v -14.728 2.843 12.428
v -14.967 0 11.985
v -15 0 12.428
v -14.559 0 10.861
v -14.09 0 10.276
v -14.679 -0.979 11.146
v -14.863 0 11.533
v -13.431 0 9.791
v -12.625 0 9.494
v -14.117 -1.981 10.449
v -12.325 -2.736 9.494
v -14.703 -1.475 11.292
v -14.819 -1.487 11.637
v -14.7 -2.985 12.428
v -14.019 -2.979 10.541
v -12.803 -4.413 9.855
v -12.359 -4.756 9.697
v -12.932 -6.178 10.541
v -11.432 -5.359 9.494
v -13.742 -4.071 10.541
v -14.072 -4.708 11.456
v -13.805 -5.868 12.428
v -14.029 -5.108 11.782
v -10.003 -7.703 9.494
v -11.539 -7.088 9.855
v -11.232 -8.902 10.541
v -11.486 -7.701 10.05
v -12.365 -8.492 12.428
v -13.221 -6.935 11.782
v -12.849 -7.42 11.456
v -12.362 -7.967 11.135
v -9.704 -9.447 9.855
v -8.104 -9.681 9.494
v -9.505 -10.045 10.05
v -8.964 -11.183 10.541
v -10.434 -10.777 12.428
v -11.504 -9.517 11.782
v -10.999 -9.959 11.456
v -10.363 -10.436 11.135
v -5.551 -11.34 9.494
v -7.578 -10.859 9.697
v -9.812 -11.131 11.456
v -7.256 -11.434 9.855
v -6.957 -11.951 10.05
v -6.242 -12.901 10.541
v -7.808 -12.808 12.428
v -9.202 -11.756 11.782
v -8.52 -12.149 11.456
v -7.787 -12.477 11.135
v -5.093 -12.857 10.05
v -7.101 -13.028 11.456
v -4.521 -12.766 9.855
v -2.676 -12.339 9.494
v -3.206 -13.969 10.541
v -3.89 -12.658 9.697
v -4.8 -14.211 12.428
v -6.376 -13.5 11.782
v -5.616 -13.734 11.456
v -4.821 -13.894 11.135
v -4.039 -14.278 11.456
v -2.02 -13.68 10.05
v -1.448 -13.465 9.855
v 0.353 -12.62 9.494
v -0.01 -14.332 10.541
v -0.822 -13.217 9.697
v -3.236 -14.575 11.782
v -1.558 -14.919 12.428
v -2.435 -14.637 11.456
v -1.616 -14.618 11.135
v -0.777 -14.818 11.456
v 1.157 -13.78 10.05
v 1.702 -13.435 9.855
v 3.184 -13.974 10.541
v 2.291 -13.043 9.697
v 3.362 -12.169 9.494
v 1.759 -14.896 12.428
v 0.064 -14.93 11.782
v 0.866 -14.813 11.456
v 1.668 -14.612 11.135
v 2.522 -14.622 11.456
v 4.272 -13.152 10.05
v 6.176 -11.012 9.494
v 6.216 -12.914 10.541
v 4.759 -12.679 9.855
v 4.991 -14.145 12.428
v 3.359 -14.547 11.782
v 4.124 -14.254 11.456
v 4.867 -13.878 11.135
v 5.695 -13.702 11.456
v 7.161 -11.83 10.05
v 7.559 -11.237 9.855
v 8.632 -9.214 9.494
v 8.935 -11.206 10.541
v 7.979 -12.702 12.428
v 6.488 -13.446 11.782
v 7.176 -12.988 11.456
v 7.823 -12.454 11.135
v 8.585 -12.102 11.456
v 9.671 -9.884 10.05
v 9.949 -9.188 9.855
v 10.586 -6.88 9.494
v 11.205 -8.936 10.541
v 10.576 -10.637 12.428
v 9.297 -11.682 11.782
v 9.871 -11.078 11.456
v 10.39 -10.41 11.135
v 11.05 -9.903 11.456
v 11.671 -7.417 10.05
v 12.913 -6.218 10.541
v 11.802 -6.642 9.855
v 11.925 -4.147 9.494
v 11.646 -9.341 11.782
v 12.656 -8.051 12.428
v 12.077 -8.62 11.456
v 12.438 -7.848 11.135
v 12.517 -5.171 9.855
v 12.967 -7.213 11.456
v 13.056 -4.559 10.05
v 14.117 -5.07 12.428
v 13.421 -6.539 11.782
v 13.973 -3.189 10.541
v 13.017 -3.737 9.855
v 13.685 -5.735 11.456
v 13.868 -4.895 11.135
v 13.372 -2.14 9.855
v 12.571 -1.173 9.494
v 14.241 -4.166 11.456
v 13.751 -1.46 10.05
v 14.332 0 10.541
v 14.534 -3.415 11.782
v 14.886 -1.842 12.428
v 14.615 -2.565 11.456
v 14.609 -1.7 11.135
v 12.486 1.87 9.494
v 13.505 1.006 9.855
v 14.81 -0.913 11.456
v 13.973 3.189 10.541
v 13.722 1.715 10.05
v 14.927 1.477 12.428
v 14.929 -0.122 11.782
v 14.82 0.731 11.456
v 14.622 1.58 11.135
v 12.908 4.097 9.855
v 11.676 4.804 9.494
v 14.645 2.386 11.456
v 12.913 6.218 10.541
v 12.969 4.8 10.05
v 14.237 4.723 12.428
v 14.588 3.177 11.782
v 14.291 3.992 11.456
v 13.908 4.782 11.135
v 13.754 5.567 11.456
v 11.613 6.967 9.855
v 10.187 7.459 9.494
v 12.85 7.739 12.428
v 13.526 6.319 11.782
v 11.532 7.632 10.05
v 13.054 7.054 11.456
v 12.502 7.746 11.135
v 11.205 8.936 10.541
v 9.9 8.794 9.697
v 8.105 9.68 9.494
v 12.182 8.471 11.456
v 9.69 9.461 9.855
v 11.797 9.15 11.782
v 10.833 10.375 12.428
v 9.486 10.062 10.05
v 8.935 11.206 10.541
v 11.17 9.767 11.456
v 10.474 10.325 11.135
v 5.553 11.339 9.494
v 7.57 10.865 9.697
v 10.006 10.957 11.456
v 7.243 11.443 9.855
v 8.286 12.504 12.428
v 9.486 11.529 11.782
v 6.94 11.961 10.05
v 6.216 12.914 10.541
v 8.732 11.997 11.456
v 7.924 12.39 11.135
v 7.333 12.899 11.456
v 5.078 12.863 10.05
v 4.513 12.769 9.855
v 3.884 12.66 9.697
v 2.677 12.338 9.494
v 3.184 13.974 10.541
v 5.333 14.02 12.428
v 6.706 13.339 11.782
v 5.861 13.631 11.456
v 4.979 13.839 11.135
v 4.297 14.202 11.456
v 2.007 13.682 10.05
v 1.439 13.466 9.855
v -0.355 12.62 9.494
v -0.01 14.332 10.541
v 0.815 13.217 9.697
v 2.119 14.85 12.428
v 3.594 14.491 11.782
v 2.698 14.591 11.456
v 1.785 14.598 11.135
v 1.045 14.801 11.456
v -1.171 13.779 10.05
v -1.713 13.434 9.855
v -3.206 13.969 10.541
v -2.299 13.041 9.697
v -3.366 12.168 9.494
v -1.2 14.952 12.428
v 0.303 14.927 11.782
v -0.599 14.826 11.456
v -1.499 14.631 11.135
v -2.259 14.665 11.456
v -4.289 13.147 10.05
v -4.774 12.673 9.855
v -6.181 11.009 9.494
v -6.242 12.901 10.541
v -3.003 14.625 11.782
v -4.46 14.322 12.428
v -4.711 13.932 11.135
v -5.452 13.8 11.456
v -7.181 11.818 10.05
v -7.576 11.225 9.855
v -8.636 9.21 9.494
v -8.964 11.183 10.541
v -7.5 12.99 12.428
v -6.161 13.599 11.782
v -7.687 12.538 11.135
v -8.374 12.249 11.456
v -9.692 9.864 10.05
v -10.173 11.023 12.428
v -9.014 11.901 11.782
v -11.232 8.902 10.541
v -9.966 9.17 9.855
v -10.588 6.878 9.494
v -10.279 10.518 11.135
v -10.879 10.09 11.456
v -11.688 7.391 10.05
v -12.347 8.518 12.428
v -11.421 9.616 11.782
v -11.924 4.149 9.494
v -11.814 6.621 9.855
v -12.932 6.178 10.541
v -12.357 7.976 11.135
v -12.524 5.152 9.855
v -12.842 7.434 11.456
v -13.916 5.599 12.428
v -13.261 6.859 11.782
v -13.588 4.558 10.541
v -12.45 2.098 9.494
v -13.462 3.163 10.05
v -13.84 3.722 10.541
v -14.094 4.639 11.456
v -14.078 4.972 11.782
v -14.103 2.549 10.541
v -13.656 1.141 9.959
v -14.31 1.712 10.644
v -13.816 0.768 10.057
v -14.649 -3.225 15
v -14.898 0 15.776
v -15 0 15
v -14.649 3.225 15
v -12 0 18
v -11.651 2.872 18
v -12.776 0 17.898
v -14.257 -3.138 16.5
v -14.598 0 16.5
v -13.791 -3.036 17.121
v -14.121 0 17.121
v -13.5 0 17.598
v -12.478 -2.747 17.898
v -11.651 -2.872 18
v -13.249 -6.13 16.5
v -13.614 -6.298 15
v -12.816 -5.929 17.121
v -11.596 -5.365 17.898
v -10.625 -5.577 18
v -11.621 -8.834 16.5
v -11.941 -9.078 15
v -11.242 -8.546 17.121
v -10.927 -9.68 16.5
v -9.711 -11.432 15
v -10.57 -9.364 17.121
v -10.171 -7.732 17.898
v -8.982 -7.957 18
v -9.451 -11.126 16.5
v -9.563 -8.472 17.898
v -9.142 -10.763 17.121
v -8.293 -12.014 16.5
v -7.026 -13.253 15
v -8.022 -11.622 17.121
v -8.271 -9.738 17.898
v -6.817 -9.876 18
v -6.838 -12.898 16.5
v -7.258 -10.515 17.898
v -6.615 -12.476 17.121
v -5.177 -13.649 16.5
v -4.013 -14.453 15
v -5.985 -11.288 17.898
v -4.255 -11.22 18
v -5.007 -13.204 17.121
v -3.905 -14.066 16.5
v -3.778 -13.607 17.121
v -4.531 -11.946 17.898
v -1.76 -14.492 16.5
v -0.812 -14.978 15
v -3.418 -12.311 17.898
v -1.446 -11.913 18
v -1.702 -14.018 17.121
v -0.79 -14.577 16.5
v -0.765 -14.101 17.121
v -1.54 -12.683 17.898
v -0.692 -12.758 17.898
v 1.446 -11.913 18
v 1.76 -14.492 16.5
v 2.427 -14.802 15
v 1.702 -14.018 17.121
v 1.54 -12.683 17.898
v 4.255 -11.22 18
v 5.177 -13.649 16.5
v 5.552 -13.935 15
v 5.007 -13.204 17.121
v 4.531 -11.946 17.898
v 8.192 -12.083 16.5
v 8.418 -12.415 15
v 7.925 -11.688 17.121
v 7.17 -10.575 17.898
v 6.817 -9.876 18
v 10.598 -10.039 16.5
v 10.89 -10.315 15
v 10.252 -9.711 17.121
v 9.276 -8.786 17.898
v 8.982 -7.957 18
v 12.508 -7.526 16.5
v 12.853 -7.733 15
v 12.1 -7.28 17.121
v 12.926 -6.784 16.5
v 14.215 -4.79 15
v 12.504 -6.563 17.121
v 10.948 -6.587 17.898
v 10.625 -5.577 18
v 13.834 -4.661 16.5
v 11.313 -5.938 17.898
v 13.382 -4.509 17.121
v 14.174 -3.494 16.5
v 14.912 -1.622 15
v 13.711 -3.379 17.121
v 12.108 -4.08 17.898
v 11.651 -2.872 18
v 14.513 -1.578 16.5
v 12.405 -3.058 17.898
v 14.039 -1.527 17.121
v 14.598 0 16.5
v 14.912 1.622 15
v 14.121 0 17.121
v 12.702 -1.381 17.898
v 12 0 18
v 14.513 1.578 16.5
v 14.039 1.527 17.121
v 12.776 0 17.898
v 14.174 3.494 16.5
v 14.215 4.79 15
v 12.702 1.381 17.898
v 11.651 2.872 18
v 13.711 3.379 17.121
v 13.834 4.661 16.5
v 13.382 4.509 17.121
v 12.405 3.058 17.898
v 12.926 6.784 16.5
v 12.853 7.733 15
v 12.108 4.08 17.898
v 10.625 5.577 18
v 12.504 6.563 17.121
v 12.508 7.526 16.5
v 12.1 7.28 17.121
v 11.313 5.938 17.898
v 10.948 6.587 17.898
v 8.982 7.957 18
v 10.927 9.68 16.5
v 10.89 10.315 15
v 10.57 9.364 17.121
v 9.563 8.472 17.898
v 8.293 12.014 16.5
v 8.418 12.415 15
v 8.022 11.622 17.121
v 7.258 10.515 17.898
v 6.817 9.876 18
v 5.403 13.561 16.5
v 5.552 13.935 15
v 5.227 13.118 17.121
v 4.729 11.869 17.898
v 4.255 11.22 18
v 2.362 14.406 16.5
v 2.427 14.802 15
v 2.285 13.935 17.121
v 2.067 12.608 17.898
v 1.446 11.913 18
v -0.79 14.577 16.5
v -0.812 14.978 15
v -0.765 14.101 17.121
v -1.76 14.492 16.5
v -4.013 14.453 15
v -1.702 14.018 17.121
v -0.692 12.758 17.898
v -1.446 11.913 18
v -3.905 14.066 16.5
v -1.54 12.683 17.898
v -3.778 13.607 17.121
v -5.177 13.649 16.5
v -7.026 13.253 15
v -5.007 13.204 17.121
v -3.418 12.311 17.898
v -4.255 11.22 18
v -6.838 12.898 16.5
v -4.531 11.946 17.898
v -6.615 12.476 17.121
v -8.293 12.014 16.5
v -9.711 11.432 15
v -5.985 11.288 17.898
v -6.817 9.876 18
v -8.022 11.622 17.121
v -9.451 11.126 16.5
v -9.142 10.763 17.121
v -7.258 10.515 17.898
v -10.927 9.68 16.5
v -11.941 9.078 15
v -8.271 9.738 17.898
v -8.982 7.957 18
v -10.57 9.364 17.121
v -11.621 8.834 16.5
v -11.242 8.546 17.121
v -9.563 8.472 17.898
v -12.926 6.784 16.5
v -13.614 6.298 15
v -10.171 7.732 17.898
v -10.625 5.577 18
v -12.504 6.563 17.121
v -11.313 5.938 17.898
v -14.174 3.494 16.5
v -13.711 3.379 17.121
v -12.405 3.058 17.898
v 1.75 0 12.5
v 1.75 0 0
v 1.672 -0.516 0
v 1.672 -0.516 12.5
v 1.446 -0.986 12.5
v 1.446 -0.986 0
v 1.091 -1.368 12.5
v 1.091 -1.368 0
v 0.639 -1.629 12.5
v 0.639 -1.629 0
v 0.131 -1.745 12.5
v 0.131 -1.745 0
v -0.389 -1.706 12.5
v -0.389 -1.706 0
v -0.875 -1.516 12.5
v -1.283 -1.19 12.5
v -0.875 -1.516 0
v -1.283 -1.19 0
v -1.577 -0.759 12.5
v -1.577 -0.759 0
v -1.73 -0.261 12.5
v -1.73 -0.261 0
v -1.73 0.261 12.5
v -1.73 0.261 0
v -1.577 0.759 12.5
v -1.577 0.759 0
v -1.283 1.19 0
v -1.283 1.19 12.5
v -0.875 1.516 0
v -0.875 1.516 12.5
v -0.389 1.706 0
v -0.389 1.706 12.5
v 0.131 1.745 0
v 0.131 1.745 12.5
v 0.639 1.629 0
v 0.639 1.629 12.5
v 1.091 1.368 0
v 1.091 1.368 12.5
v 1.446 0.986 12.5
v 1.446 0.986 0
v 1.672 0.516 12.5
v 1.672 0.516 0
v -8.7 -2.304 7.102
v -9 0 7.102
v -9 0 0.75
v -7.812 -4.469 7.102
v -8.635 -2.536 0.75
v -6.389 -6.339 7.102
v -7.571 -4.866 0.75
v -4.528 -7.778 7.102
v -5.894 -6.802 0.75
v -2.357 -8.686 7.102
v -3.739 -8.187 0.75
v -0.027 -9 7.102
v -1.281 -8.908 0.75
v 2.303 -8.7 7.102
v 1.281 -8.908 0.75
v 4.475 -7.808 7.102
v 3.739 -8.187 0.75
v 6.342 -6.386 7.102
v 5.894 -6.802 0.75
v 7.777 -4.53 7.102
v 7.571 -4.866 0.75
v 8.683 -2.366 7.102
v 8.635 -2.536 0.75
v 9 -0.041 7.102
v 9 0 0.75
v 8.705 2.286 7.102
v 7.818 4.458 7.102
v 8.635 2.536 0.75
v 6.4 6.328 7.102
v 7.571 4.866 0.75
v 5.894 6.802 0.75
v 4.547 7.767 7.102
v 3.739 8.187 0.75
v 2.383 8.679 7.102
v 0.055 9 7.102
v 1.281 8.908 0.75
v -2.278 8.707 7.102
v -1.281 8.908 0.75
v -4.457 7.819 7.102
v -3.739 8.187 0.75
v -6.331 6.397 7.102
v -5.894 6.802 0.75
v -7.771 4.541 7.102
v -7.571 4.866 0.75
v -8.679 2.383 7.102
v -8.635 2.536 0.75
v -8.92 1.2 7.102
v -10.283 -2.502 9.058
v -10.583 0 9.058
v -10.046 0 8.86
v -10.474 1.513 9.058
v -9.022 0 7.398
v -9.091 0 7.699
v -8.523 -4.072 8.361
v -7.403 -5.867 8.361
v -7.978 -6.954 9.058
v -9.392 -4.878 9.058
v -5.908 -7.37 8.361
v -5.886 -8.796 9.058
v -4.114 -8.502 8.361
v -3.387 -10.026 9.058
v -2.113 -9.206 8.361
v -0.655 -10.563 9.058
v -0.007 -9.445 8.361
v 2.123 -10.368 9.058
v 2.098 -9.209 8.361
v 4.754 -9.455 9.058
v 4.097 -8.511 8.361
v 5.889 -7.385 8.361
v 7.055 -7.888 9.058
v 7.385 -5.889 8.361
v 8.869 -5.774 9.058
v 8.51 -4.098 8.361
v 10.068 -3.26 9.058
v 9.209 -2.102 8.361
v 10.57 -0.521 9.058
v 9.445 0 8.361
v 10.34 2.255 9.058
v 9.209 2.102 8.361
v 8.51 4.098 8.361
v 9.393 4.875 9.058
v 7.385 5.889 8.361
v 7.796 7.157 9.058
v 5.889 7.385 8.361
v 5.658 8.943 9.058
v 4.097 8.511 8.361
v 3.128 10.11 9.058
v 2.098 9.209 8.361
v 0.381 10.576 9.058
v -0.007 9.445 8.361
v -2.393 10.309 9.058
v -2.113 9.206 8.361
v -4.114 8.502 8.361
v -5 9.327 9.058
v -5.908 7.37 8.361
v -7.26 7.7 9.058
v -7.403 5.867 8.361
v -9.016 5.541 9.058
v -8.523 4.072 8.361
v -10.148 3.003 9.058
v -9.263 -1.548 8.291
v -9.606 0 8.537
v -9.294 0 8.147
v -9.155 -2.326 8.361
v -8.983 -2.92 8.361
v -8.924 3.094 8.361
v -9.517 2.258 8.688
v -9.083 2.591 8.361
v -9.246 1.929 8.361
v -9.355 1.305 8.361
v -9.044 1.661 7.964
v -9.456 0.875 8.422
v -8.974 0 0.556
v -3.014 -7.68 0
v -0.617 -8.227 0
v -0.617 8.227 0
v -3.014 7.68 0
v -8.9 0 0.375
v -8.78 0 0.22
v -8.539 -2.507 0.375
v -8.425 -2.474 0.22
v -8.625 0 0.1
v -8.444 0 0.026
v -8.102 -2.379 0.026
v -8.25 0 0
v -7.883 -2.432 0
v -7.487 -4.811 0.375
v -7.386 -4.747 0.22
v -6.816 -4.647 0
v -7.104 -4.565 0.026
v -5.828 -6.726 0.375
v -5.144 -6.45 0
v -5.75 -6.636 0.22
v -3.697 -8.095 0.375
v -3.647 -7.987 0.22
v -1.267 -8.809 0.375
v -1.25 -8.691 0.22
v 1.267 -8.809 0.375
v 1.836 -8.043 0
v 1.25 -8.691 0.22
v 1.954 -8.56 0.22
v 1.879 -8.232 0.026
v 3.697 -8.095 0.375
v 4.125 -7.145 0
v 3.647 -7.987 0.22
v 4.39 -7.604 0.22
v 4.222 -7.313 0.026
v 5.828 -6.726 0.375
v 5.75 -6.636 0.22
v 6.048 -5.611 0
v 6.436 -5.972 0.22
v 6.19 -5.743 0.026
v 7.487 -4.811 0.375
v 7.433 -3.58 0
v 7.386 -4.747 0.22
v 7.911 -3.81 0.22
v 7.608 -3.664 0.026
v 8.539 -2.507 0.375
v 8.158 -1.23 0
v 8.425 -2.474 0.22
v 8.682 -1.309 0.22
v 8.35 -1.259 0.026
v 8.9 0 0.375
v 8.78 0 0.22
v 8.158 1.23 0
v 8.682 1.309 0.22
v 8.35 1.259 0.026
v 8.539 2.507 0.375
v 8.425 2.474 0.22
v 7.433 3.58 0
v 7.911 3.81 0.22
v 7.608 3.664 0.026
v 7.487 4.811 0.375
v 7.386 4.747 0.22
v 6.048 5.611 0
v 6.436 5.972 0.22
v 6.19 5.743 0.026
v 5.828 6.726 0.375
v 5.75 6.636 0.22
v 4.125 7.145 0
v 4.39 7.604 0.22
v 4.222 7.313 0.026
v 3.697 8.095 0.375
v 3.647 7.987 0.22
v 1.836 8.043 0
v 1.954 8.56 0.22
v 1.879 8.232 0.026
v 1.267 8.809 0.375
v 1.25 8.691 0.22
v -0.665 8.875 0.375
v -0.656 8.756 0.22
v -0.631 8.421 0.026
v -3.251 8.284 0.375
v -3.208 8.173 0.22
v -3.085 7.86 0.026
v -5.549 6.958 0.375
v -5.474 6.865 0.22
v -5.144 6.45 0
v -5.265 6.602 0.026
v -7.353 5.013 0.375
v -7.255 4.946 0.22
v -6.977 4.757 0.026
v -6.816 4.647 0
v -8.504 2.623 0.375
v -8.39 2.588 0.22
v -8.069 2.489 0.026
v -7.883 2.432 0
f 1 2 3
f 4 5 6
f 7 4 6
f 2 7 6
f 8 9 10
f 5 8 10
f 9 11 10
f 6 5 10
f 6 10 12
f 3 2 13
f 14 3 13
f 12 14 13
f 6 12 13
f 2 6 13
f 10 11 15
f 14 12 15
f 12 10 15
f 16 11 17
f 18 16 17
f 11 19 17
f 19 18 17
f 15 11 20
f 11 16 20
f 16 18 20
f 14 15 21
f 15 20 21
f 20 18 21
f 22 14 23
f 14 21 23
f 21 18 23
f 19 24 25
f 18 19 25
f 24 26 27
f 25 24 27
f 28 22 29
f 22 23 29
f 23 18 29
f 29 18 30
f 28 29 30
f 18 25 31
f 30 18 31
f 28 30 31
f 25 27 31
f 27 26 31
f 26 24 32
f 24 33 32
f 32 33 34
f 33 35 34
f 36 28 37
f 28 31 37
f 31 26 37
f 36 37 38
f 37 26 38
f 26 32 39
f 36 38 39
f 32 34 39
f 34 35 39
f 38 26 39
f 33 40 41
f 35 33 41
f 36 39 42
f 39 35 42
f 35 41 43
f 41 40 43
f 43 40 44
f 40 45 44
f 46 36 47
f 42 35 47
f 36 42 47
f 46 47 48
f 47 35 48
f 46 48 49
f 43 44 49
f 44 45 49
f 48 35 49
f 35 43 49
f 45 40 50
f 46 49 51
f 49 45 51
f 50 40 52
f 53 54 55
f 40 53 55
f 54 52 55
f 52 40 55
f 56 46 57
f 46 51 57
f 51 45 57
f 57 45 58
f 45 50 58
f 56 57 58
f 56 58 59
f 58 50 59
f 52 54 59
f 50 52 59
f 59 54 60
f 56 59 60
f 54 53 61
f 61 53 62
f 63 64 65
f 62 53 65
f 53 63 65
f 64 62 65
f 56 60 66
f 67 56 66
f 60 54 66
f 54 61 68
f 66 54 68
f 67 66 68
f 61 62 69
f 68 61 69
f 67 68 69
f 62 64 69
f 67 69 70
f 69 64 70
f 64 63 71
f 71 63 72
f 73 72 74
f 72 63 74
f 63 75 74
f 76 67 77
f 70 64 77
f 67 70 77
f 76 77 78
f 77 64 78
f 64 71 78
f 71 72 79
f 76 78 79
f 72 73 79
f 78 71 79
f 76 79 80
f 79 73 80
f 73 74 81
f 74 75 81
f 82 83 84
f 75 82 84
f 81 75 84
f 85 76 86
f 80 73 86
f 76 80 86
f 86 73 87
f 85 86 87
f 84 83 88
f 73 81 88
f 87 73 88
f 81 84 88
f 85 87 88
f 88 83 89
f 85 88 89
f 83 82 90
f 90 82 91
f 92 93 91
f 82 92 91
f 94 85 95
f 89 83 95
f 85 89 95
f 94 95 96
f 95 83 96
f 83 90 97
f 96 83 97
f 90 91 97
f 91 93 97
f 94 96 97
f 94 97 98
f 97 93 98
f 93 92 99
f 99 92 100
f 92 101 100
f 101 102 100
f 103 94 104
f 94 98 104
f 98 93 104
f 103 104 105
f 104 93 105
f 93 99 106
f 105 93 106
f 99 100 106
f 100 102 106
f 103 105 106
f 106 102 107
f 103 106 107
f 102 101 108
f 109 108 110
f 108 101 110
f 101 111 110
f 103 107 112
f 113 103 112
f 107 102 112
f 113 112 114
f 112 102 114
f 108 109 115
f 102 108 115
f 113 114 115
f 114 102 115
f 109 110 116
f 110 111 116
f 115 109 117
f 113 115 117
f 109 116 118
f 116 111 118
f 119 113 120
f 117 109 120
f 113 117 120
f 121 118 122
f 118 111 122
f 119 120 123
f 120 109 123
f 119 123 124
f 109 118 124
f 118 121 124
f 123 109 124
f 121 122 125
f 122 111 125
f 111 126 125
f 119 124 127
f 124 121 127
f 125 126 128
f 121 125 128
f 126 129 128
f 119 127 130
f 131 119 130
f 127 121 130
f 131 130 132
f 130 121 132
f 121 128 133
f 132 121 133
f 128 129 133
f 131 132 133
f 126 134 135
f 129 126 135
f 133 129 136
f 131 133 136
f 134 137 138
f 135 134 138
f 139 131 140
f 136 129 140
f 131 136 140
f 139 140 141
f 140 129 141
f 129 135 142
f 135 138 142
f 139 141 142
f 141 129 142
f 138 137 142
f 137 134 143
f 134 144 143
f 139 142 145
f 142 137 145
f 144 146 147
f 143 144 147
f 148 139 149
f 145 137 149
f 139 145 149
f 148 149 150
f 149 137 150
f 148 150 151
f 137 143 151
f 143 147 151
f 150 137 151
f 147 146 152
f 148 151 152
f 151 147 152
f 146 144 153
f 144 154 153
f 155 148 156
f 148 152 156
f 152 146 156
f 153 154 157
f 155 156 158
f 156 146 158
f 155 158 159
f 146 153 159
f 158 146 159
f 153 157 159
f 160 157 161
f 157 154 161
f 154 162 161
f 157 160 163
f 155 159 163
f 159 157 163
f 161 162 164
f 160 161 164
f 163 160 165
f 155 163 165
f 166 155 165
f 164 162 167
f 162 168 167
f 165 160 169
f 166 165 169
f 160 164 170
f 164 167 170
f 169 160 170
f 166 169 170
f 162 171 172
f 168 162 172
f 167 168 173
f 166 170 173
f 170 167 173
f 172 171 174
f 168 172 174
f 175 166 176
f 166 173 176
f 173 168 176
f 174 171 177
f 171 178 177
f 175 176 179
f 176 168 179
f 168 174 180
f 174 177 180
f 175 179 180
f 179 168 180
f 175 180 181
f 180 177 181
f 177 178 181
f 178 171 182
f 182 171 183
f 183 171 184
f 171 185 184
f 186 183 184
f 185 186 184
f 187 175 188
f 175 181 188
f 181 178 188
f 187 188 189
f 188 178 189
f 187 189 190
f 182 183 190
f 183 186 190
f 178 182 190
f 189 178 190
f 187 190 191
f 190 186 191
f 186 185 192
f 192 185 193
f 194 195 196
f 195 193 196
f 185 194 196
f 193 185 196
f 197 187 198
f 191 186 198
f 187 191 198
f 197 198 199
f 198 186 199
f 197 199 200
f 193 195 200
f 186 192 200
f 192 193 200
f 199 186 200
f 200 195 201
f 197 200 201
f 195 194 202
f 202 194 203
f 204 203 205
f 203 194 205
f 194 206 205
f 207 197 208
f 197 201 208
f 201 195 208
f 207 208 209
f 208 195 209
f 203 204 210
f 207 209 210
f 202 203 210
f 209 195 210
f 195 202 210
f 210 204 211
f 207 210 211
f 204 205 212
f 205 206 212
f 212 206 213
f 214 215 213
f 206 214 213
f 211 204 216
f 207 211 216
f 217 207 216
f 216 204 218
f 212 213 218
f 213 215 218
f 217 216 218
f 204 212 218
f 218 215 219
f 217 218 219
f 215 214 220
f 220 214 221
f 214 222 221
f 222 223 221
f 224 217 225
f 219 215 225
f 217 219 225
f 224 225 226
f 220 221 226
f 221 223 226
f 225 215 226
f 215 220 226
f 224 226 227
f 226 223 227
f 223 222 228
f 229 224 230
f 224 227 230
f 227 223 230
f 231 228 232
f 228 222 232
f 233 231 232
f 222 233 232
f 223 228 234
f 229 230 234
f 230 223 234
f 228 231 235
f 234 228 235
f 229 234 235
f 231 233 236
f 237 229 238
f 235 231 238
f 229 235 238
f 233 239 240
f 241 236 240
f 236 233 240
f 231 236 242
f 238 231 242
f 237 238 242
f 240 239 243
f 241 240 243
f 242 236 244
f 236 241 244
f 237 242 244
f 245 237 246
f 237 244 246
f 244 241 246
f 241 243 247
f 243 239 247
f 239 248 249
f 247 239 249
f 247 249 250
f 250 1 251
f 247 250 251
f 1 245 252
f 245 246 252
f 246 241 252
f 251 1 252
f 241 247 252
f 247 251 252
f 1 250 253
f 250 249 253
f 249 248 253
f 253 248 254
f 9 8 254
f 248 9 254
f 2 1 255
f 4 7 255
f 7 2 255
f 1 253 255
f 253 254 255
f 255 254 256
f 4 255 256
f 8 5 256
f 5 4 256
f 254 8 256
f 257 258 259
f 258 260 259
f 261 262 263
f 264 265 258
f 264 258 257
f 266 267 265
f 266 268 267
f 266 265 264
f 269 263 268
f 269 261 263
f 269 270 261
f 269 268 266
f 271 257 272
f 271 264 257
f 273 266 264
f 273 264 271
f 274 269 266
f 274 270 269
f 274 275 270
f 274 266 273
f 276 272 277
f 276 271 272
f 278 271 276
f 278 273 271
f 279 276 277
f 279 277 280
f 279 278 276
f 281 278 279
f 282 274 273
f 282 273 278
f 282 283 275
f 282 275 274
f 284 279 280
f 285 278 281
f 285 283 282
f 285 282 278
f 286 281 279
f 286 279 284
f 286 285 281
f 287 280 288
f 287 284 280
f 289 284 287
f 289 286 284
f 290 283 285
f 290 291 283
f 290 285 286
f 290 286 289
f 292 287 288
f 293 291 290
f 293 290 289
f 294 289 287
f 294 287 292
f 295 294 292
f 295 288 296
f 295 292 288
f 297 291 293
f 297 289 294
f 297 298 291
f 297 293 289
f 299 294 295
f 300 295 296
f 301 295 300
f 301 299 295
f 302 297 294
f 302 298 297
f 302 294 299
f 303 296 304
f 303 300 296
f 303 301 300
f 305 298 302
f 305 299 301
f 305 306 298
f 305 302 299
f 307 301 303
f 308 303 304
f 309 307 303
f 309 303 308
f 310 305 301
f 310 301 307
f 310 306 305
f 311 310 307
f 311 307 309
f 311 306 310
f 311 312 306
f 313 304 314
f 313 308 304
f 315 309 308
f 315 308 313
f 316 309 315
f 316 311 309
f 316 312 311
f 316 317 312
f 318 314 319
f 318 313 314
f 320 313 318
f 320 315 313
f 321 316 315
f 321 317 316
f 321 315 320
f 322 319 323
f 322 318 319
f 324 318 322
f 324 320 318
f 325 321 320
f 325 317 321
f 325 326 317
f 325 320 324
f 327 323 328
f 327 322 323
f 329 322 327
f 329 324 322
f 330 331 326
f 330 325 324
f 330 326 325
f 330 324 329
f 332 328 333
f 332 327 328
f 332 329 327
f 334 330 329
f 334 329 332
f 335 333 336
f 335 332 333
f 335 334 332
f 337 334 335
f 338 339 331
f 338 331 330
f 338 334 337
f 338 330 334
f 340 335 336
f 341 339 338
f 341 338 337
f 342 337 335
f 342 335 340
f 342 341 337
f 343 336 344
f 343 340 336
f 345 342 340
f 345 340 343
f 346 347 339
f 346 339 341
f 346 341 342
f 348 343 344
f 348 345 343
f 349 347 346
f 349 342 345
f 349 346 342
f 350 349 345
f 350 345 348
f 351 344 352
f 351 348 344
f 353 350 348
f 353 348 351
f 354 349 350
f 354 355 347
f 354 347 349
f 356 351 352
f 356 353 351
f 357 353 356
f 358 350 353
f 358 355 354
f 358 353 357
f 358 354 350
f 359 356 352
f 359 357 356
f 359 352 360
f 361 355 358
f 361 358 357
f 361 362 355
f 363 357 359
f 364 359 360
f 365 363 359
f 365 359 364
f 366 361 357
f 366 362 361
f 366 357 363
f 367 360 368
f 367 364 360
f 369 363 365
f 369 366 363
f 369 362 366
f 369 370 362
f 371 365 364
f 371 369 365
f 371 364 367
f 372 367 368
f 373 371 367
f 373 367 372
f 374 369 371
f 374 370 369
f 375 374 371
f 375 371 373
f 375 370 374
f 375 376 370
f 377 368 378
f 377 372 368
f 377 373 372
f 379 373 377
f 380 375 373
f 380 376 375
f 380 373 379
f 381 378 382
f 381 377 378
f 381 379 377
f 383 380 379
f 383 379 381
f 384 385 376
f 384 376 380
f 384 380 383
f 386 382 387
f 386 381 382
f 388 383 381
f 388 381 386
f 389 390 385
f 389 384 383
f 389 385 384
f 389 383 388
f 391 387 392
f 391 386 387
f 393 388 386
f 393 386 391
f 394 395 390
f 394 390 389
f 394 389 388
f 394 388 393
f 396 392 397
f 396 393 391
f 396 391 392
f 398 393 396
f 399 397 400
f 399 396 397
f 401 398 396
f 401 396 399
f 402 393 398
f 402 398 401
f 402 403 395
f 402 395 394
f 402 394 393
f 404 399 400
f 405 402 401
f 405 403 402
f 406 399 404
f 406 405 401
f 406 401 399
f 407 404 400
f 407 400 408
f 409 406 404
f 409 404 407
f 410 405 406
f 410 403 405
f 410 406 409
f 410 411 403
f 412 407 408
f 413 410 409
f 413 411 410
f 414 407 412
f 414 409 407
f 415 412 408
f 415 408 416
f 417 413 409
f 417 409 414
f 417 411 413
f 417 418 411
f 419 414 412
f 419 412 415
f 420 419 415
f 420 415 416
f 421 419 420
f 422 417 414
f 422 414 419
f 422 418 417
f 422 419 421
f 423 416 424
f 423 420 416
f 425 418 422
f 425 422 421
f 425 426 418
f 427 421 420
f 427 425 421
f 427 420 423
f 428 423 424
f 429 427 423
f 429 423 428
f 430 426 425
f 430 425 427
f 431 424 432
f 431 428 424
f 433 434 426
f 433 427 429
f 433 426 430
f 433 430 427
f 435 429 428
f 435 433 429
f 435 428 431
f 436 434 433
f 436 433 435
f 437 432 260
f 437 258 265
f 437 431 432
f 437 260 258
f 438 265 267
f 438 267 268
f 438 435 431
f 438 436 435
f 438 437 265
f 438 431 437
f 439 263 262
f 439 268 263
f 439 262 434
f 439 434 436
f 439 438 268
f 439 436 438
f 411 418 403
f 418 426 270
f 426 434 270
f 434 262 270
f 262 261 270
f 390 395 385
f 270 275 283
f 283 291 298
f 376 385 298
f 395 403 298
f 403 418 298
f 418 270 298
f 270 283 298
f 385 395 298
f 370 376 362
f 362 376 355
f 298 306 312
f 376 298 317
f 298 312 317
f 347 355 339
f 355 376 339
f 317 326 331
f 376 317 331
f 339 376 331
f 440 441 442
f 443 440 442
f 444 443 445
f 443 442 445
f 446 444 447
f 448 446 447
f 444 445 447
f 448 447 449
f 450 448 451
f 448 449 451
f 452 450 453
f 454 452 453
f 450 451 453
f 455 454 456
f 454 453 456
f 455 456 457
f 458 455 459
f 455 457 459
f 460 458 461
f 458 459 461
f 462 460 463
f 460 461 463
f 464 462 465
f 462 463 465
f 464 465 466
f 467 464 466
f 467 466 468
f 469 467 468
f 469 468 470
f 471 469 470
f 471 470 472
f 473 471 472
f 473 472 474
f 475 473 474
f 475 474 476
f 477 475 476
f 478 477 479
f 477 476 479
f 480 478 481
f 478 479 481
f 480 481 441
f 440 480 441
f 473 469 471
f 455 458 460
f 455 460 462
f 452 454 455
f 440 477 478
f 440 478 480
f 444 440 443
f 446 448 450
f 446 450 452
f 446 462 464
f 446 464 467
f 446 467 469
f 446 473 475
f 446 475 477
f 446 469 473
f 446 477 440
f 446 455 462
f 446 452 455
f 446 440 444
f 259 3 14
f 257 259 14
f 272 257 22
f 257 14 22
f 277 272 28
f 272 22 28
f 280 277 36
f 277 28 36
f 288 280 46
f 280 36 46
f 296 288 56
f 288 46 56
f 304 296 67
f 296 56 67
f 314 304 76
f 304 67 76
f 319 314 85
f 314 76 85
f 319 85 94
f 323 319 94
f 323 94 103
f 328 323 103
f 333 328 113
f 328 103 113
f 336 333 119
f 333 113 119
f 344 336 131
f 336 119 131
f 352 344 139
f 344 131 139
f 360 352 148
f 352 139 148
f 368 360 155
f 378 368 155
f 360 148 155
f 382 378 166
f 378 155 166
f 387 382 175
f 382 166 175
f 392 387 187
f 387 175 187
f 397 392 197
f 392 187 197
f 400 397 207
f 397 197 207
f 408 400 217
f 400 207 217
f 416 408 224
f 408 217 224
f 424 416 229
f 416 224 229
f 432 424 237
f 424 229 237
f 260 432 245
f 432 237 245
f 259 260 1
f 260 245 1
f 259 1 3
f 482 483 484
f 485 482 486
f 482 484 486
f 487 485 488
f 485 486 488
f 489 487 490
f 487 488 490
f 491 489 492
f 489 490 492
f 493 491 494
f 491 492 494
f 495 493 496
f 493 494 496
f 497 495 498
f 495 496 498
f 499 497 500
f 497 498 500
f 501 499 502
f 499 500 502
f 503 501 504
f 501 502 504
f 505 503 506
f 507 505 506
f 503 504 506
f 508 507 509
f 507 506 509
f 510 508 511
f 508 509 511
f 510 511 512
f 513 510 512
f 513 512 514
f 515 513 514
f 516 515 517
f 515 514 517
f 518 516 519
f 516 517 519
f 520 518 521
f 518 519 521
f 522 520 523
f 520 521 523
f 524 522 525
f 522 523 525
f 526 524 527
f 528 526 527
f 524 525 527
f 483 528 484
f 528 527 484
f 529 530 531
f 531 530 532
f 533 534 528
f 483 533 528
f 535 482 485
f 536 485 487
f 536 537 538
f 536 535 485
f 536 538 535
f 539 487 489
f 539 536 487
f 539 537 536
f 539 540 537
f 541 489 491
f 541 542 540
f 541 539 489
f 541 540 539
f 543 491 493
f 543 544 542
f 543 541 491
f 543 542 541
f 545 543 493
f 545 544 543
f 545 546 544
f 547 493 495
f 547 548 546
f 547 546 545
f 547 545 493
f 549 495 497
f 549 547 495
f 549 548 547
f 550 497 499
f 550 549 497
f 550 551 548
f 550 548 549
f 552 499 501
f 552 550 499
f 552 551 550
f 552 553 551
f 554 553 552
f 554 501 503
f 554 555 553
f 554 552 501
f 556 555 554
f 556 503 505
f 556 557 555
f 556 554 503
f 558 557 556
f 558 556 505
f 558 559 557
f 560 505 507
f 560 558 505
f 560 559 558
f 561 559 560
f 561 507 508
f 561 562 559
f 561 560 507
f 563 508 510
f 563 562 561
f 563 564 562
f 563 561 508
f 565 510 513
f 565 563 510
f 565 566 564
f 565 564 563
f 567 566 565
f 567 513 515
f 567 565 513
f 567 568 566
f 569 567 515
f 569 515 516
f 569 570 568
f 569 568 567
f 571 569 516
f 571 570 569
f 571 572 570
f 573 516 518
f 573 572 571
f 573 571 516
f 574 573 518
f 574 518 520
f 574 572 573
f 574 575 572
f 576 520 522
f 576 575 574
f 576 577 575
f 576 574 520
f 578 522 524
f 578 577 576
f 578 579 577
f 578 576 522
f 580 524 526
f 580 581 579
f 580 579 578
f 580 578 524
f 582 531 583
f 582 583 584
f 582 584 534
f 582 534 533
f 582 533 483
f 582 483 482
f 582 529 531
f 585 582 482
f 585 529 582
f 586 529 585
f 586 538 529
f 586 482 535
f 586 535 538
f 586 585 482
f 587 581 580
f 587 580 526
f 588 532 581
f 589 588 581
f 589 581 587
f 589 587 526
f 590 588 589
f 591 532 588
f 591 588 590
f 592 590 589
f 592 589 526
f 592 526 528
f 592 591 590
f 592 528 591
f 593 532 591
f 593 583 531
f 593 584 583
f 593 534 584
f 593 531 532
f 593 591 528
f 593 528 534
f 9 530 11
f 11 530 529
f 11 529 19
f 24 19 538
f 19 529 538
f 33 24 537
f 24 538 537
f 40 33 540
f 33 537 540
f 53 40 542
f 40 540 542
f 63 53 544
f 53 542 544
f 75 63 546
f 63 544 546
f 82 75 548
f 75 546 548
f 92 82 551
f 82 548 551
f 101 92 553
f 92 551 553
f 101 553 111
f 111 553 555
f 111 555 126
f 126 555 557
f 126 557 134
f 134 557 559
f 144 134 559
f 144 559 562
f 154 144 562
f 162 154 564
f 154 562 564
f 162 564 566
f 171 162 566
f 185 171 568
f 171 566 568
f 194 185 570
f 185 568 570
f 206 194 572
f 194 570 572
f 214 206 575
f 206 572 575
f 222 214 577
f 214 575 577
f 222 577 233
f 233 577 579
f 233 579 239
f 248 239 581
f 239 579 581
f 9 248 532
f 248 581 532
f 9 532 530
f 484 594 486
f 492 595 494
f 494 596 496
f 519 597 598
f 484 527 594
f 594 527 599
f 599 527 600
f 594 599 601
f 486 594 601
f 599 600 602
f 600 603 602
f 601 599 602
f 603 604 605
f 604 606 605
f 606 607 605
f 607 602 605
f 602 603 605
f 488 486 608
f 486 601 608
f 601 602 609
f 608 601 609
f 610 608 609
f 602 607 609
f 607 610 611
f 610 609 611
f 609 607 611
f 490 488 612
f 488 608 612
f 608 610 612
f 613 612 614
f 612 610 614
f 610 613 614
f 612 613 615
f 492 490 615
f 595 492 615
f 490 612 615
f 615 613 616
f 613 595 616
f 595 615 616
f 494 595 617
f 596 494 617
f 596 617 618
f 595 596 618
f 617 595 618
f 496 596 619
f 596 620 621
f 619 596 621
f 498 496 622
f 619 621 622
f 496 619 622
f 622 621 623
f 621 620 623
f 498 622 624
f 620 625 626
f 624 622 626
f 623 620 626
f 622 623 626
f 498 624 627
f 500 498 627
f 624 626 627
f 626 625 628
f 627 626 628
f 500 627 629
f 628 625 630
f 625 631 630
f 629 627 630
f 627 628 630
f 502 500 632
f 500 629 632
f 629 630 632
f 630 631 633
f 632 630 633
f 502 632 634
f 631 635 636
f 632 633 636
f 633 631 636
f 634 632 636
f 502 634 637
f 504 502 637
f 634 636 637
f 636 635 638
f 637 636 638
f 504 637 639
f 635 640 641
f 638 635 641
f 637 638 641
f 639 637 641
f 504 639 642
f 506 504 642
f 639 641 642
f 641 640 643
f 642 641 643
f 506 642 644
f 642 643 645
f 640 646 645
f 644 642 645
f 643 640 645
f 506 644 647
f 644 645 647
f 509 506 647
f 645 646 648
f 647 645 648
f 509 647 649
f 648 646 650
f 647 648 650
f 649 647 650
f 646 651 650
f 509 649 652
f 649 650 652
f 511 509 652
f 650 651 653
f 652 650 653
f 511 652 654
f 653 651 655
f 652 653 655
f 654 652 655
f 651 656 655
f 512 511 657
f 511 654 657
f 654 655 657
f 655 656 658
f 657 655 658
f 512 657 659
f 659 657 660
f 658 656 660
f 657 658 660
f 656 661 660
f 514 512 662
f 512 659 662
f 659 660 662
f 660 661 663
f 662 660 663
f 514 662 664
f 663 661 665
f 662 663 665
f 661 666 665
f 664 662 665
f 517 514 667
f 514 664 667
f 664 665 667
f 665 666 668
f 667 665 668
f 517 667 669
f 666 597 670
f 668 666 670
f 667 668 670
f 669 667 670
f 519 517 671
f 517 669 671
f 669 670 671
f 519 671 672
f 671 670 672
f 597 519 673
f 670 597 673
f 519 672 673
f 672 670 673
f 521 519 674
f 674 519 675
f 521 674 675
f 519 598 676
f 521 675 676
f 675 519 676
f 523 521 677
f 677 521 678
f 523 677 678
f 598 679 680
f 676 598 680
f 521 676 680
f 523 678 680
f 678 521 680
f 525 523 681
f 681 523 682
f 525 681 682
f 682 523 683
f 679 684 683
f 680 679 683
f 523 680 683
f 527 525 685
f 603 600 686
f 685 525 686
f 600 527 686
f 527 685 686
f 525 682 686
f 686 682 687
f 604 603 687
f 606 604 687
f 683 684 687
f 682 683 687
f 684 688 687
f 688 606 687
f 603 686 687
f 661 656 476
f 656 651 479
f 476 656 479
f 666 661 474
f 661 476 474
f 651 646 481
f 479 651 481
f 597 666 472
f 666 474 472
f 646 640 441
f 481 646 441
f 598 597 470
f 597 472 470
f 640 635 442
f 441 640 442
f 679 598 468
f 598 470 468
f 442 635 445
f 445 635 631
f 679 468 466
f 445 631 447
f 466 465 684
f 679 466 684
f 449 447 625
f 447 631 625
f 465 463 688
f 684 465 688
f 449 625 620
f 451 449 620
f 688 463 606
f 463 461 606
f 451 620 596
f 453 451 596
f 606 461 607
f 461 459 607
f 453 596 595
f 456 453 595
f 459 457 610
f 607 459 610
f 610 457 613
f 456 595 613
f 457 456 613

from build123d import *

# Parameters (mm, degrees)
F2_R     = 1.75
F3_DEPTH = 12.5
F4_R     = 3
F5_R     = 2
F6_R     = 0.75


with BuildPart() as f1:
    # F0 (on Front) → F1 (revolve)
    with BuildSketch(Plane.XZ):
        Polygon((-9, 0), (0, 0), (0, 18), (-15, 18), (-15, 10), (-9, 8.721018), align=None)
    revolve(axis=Axis((0, 0, 9), (0, 0, 1)))

    # F2 (on face) → F3 (cut)
    with BuildSketch(Plane(origin=(0, 0, 0), x_dir=(1, 0, 0), z_dir=(0, 0, -1))):
        Circle(F2_R)
    extrude(amount=-F3_DEPTH, mode=Mode.SUBTRACT)

    # F4
    f4_edges = [f1.edges().sort_by_distance(p)[0] for p in [
        (15, 0, 18),
        (15, 0, 10),
    ]]
    fillet(f4_edges, radius=F4_R)

    # F5
    f5_edges = [f1.edges().sort_by_distance(p)[0] for p in [
        (9, 0, 8.721018),
    ]]
    fillet(f5_edges, radius=F5_R)

    # F6
    f6_edges = [f1.edges().sort_by_distance(p)[0] for p in [
        (9, 0, 0),
    ]]
    fillet(f6_edges, radius=F6_R)


solid = f1.part
